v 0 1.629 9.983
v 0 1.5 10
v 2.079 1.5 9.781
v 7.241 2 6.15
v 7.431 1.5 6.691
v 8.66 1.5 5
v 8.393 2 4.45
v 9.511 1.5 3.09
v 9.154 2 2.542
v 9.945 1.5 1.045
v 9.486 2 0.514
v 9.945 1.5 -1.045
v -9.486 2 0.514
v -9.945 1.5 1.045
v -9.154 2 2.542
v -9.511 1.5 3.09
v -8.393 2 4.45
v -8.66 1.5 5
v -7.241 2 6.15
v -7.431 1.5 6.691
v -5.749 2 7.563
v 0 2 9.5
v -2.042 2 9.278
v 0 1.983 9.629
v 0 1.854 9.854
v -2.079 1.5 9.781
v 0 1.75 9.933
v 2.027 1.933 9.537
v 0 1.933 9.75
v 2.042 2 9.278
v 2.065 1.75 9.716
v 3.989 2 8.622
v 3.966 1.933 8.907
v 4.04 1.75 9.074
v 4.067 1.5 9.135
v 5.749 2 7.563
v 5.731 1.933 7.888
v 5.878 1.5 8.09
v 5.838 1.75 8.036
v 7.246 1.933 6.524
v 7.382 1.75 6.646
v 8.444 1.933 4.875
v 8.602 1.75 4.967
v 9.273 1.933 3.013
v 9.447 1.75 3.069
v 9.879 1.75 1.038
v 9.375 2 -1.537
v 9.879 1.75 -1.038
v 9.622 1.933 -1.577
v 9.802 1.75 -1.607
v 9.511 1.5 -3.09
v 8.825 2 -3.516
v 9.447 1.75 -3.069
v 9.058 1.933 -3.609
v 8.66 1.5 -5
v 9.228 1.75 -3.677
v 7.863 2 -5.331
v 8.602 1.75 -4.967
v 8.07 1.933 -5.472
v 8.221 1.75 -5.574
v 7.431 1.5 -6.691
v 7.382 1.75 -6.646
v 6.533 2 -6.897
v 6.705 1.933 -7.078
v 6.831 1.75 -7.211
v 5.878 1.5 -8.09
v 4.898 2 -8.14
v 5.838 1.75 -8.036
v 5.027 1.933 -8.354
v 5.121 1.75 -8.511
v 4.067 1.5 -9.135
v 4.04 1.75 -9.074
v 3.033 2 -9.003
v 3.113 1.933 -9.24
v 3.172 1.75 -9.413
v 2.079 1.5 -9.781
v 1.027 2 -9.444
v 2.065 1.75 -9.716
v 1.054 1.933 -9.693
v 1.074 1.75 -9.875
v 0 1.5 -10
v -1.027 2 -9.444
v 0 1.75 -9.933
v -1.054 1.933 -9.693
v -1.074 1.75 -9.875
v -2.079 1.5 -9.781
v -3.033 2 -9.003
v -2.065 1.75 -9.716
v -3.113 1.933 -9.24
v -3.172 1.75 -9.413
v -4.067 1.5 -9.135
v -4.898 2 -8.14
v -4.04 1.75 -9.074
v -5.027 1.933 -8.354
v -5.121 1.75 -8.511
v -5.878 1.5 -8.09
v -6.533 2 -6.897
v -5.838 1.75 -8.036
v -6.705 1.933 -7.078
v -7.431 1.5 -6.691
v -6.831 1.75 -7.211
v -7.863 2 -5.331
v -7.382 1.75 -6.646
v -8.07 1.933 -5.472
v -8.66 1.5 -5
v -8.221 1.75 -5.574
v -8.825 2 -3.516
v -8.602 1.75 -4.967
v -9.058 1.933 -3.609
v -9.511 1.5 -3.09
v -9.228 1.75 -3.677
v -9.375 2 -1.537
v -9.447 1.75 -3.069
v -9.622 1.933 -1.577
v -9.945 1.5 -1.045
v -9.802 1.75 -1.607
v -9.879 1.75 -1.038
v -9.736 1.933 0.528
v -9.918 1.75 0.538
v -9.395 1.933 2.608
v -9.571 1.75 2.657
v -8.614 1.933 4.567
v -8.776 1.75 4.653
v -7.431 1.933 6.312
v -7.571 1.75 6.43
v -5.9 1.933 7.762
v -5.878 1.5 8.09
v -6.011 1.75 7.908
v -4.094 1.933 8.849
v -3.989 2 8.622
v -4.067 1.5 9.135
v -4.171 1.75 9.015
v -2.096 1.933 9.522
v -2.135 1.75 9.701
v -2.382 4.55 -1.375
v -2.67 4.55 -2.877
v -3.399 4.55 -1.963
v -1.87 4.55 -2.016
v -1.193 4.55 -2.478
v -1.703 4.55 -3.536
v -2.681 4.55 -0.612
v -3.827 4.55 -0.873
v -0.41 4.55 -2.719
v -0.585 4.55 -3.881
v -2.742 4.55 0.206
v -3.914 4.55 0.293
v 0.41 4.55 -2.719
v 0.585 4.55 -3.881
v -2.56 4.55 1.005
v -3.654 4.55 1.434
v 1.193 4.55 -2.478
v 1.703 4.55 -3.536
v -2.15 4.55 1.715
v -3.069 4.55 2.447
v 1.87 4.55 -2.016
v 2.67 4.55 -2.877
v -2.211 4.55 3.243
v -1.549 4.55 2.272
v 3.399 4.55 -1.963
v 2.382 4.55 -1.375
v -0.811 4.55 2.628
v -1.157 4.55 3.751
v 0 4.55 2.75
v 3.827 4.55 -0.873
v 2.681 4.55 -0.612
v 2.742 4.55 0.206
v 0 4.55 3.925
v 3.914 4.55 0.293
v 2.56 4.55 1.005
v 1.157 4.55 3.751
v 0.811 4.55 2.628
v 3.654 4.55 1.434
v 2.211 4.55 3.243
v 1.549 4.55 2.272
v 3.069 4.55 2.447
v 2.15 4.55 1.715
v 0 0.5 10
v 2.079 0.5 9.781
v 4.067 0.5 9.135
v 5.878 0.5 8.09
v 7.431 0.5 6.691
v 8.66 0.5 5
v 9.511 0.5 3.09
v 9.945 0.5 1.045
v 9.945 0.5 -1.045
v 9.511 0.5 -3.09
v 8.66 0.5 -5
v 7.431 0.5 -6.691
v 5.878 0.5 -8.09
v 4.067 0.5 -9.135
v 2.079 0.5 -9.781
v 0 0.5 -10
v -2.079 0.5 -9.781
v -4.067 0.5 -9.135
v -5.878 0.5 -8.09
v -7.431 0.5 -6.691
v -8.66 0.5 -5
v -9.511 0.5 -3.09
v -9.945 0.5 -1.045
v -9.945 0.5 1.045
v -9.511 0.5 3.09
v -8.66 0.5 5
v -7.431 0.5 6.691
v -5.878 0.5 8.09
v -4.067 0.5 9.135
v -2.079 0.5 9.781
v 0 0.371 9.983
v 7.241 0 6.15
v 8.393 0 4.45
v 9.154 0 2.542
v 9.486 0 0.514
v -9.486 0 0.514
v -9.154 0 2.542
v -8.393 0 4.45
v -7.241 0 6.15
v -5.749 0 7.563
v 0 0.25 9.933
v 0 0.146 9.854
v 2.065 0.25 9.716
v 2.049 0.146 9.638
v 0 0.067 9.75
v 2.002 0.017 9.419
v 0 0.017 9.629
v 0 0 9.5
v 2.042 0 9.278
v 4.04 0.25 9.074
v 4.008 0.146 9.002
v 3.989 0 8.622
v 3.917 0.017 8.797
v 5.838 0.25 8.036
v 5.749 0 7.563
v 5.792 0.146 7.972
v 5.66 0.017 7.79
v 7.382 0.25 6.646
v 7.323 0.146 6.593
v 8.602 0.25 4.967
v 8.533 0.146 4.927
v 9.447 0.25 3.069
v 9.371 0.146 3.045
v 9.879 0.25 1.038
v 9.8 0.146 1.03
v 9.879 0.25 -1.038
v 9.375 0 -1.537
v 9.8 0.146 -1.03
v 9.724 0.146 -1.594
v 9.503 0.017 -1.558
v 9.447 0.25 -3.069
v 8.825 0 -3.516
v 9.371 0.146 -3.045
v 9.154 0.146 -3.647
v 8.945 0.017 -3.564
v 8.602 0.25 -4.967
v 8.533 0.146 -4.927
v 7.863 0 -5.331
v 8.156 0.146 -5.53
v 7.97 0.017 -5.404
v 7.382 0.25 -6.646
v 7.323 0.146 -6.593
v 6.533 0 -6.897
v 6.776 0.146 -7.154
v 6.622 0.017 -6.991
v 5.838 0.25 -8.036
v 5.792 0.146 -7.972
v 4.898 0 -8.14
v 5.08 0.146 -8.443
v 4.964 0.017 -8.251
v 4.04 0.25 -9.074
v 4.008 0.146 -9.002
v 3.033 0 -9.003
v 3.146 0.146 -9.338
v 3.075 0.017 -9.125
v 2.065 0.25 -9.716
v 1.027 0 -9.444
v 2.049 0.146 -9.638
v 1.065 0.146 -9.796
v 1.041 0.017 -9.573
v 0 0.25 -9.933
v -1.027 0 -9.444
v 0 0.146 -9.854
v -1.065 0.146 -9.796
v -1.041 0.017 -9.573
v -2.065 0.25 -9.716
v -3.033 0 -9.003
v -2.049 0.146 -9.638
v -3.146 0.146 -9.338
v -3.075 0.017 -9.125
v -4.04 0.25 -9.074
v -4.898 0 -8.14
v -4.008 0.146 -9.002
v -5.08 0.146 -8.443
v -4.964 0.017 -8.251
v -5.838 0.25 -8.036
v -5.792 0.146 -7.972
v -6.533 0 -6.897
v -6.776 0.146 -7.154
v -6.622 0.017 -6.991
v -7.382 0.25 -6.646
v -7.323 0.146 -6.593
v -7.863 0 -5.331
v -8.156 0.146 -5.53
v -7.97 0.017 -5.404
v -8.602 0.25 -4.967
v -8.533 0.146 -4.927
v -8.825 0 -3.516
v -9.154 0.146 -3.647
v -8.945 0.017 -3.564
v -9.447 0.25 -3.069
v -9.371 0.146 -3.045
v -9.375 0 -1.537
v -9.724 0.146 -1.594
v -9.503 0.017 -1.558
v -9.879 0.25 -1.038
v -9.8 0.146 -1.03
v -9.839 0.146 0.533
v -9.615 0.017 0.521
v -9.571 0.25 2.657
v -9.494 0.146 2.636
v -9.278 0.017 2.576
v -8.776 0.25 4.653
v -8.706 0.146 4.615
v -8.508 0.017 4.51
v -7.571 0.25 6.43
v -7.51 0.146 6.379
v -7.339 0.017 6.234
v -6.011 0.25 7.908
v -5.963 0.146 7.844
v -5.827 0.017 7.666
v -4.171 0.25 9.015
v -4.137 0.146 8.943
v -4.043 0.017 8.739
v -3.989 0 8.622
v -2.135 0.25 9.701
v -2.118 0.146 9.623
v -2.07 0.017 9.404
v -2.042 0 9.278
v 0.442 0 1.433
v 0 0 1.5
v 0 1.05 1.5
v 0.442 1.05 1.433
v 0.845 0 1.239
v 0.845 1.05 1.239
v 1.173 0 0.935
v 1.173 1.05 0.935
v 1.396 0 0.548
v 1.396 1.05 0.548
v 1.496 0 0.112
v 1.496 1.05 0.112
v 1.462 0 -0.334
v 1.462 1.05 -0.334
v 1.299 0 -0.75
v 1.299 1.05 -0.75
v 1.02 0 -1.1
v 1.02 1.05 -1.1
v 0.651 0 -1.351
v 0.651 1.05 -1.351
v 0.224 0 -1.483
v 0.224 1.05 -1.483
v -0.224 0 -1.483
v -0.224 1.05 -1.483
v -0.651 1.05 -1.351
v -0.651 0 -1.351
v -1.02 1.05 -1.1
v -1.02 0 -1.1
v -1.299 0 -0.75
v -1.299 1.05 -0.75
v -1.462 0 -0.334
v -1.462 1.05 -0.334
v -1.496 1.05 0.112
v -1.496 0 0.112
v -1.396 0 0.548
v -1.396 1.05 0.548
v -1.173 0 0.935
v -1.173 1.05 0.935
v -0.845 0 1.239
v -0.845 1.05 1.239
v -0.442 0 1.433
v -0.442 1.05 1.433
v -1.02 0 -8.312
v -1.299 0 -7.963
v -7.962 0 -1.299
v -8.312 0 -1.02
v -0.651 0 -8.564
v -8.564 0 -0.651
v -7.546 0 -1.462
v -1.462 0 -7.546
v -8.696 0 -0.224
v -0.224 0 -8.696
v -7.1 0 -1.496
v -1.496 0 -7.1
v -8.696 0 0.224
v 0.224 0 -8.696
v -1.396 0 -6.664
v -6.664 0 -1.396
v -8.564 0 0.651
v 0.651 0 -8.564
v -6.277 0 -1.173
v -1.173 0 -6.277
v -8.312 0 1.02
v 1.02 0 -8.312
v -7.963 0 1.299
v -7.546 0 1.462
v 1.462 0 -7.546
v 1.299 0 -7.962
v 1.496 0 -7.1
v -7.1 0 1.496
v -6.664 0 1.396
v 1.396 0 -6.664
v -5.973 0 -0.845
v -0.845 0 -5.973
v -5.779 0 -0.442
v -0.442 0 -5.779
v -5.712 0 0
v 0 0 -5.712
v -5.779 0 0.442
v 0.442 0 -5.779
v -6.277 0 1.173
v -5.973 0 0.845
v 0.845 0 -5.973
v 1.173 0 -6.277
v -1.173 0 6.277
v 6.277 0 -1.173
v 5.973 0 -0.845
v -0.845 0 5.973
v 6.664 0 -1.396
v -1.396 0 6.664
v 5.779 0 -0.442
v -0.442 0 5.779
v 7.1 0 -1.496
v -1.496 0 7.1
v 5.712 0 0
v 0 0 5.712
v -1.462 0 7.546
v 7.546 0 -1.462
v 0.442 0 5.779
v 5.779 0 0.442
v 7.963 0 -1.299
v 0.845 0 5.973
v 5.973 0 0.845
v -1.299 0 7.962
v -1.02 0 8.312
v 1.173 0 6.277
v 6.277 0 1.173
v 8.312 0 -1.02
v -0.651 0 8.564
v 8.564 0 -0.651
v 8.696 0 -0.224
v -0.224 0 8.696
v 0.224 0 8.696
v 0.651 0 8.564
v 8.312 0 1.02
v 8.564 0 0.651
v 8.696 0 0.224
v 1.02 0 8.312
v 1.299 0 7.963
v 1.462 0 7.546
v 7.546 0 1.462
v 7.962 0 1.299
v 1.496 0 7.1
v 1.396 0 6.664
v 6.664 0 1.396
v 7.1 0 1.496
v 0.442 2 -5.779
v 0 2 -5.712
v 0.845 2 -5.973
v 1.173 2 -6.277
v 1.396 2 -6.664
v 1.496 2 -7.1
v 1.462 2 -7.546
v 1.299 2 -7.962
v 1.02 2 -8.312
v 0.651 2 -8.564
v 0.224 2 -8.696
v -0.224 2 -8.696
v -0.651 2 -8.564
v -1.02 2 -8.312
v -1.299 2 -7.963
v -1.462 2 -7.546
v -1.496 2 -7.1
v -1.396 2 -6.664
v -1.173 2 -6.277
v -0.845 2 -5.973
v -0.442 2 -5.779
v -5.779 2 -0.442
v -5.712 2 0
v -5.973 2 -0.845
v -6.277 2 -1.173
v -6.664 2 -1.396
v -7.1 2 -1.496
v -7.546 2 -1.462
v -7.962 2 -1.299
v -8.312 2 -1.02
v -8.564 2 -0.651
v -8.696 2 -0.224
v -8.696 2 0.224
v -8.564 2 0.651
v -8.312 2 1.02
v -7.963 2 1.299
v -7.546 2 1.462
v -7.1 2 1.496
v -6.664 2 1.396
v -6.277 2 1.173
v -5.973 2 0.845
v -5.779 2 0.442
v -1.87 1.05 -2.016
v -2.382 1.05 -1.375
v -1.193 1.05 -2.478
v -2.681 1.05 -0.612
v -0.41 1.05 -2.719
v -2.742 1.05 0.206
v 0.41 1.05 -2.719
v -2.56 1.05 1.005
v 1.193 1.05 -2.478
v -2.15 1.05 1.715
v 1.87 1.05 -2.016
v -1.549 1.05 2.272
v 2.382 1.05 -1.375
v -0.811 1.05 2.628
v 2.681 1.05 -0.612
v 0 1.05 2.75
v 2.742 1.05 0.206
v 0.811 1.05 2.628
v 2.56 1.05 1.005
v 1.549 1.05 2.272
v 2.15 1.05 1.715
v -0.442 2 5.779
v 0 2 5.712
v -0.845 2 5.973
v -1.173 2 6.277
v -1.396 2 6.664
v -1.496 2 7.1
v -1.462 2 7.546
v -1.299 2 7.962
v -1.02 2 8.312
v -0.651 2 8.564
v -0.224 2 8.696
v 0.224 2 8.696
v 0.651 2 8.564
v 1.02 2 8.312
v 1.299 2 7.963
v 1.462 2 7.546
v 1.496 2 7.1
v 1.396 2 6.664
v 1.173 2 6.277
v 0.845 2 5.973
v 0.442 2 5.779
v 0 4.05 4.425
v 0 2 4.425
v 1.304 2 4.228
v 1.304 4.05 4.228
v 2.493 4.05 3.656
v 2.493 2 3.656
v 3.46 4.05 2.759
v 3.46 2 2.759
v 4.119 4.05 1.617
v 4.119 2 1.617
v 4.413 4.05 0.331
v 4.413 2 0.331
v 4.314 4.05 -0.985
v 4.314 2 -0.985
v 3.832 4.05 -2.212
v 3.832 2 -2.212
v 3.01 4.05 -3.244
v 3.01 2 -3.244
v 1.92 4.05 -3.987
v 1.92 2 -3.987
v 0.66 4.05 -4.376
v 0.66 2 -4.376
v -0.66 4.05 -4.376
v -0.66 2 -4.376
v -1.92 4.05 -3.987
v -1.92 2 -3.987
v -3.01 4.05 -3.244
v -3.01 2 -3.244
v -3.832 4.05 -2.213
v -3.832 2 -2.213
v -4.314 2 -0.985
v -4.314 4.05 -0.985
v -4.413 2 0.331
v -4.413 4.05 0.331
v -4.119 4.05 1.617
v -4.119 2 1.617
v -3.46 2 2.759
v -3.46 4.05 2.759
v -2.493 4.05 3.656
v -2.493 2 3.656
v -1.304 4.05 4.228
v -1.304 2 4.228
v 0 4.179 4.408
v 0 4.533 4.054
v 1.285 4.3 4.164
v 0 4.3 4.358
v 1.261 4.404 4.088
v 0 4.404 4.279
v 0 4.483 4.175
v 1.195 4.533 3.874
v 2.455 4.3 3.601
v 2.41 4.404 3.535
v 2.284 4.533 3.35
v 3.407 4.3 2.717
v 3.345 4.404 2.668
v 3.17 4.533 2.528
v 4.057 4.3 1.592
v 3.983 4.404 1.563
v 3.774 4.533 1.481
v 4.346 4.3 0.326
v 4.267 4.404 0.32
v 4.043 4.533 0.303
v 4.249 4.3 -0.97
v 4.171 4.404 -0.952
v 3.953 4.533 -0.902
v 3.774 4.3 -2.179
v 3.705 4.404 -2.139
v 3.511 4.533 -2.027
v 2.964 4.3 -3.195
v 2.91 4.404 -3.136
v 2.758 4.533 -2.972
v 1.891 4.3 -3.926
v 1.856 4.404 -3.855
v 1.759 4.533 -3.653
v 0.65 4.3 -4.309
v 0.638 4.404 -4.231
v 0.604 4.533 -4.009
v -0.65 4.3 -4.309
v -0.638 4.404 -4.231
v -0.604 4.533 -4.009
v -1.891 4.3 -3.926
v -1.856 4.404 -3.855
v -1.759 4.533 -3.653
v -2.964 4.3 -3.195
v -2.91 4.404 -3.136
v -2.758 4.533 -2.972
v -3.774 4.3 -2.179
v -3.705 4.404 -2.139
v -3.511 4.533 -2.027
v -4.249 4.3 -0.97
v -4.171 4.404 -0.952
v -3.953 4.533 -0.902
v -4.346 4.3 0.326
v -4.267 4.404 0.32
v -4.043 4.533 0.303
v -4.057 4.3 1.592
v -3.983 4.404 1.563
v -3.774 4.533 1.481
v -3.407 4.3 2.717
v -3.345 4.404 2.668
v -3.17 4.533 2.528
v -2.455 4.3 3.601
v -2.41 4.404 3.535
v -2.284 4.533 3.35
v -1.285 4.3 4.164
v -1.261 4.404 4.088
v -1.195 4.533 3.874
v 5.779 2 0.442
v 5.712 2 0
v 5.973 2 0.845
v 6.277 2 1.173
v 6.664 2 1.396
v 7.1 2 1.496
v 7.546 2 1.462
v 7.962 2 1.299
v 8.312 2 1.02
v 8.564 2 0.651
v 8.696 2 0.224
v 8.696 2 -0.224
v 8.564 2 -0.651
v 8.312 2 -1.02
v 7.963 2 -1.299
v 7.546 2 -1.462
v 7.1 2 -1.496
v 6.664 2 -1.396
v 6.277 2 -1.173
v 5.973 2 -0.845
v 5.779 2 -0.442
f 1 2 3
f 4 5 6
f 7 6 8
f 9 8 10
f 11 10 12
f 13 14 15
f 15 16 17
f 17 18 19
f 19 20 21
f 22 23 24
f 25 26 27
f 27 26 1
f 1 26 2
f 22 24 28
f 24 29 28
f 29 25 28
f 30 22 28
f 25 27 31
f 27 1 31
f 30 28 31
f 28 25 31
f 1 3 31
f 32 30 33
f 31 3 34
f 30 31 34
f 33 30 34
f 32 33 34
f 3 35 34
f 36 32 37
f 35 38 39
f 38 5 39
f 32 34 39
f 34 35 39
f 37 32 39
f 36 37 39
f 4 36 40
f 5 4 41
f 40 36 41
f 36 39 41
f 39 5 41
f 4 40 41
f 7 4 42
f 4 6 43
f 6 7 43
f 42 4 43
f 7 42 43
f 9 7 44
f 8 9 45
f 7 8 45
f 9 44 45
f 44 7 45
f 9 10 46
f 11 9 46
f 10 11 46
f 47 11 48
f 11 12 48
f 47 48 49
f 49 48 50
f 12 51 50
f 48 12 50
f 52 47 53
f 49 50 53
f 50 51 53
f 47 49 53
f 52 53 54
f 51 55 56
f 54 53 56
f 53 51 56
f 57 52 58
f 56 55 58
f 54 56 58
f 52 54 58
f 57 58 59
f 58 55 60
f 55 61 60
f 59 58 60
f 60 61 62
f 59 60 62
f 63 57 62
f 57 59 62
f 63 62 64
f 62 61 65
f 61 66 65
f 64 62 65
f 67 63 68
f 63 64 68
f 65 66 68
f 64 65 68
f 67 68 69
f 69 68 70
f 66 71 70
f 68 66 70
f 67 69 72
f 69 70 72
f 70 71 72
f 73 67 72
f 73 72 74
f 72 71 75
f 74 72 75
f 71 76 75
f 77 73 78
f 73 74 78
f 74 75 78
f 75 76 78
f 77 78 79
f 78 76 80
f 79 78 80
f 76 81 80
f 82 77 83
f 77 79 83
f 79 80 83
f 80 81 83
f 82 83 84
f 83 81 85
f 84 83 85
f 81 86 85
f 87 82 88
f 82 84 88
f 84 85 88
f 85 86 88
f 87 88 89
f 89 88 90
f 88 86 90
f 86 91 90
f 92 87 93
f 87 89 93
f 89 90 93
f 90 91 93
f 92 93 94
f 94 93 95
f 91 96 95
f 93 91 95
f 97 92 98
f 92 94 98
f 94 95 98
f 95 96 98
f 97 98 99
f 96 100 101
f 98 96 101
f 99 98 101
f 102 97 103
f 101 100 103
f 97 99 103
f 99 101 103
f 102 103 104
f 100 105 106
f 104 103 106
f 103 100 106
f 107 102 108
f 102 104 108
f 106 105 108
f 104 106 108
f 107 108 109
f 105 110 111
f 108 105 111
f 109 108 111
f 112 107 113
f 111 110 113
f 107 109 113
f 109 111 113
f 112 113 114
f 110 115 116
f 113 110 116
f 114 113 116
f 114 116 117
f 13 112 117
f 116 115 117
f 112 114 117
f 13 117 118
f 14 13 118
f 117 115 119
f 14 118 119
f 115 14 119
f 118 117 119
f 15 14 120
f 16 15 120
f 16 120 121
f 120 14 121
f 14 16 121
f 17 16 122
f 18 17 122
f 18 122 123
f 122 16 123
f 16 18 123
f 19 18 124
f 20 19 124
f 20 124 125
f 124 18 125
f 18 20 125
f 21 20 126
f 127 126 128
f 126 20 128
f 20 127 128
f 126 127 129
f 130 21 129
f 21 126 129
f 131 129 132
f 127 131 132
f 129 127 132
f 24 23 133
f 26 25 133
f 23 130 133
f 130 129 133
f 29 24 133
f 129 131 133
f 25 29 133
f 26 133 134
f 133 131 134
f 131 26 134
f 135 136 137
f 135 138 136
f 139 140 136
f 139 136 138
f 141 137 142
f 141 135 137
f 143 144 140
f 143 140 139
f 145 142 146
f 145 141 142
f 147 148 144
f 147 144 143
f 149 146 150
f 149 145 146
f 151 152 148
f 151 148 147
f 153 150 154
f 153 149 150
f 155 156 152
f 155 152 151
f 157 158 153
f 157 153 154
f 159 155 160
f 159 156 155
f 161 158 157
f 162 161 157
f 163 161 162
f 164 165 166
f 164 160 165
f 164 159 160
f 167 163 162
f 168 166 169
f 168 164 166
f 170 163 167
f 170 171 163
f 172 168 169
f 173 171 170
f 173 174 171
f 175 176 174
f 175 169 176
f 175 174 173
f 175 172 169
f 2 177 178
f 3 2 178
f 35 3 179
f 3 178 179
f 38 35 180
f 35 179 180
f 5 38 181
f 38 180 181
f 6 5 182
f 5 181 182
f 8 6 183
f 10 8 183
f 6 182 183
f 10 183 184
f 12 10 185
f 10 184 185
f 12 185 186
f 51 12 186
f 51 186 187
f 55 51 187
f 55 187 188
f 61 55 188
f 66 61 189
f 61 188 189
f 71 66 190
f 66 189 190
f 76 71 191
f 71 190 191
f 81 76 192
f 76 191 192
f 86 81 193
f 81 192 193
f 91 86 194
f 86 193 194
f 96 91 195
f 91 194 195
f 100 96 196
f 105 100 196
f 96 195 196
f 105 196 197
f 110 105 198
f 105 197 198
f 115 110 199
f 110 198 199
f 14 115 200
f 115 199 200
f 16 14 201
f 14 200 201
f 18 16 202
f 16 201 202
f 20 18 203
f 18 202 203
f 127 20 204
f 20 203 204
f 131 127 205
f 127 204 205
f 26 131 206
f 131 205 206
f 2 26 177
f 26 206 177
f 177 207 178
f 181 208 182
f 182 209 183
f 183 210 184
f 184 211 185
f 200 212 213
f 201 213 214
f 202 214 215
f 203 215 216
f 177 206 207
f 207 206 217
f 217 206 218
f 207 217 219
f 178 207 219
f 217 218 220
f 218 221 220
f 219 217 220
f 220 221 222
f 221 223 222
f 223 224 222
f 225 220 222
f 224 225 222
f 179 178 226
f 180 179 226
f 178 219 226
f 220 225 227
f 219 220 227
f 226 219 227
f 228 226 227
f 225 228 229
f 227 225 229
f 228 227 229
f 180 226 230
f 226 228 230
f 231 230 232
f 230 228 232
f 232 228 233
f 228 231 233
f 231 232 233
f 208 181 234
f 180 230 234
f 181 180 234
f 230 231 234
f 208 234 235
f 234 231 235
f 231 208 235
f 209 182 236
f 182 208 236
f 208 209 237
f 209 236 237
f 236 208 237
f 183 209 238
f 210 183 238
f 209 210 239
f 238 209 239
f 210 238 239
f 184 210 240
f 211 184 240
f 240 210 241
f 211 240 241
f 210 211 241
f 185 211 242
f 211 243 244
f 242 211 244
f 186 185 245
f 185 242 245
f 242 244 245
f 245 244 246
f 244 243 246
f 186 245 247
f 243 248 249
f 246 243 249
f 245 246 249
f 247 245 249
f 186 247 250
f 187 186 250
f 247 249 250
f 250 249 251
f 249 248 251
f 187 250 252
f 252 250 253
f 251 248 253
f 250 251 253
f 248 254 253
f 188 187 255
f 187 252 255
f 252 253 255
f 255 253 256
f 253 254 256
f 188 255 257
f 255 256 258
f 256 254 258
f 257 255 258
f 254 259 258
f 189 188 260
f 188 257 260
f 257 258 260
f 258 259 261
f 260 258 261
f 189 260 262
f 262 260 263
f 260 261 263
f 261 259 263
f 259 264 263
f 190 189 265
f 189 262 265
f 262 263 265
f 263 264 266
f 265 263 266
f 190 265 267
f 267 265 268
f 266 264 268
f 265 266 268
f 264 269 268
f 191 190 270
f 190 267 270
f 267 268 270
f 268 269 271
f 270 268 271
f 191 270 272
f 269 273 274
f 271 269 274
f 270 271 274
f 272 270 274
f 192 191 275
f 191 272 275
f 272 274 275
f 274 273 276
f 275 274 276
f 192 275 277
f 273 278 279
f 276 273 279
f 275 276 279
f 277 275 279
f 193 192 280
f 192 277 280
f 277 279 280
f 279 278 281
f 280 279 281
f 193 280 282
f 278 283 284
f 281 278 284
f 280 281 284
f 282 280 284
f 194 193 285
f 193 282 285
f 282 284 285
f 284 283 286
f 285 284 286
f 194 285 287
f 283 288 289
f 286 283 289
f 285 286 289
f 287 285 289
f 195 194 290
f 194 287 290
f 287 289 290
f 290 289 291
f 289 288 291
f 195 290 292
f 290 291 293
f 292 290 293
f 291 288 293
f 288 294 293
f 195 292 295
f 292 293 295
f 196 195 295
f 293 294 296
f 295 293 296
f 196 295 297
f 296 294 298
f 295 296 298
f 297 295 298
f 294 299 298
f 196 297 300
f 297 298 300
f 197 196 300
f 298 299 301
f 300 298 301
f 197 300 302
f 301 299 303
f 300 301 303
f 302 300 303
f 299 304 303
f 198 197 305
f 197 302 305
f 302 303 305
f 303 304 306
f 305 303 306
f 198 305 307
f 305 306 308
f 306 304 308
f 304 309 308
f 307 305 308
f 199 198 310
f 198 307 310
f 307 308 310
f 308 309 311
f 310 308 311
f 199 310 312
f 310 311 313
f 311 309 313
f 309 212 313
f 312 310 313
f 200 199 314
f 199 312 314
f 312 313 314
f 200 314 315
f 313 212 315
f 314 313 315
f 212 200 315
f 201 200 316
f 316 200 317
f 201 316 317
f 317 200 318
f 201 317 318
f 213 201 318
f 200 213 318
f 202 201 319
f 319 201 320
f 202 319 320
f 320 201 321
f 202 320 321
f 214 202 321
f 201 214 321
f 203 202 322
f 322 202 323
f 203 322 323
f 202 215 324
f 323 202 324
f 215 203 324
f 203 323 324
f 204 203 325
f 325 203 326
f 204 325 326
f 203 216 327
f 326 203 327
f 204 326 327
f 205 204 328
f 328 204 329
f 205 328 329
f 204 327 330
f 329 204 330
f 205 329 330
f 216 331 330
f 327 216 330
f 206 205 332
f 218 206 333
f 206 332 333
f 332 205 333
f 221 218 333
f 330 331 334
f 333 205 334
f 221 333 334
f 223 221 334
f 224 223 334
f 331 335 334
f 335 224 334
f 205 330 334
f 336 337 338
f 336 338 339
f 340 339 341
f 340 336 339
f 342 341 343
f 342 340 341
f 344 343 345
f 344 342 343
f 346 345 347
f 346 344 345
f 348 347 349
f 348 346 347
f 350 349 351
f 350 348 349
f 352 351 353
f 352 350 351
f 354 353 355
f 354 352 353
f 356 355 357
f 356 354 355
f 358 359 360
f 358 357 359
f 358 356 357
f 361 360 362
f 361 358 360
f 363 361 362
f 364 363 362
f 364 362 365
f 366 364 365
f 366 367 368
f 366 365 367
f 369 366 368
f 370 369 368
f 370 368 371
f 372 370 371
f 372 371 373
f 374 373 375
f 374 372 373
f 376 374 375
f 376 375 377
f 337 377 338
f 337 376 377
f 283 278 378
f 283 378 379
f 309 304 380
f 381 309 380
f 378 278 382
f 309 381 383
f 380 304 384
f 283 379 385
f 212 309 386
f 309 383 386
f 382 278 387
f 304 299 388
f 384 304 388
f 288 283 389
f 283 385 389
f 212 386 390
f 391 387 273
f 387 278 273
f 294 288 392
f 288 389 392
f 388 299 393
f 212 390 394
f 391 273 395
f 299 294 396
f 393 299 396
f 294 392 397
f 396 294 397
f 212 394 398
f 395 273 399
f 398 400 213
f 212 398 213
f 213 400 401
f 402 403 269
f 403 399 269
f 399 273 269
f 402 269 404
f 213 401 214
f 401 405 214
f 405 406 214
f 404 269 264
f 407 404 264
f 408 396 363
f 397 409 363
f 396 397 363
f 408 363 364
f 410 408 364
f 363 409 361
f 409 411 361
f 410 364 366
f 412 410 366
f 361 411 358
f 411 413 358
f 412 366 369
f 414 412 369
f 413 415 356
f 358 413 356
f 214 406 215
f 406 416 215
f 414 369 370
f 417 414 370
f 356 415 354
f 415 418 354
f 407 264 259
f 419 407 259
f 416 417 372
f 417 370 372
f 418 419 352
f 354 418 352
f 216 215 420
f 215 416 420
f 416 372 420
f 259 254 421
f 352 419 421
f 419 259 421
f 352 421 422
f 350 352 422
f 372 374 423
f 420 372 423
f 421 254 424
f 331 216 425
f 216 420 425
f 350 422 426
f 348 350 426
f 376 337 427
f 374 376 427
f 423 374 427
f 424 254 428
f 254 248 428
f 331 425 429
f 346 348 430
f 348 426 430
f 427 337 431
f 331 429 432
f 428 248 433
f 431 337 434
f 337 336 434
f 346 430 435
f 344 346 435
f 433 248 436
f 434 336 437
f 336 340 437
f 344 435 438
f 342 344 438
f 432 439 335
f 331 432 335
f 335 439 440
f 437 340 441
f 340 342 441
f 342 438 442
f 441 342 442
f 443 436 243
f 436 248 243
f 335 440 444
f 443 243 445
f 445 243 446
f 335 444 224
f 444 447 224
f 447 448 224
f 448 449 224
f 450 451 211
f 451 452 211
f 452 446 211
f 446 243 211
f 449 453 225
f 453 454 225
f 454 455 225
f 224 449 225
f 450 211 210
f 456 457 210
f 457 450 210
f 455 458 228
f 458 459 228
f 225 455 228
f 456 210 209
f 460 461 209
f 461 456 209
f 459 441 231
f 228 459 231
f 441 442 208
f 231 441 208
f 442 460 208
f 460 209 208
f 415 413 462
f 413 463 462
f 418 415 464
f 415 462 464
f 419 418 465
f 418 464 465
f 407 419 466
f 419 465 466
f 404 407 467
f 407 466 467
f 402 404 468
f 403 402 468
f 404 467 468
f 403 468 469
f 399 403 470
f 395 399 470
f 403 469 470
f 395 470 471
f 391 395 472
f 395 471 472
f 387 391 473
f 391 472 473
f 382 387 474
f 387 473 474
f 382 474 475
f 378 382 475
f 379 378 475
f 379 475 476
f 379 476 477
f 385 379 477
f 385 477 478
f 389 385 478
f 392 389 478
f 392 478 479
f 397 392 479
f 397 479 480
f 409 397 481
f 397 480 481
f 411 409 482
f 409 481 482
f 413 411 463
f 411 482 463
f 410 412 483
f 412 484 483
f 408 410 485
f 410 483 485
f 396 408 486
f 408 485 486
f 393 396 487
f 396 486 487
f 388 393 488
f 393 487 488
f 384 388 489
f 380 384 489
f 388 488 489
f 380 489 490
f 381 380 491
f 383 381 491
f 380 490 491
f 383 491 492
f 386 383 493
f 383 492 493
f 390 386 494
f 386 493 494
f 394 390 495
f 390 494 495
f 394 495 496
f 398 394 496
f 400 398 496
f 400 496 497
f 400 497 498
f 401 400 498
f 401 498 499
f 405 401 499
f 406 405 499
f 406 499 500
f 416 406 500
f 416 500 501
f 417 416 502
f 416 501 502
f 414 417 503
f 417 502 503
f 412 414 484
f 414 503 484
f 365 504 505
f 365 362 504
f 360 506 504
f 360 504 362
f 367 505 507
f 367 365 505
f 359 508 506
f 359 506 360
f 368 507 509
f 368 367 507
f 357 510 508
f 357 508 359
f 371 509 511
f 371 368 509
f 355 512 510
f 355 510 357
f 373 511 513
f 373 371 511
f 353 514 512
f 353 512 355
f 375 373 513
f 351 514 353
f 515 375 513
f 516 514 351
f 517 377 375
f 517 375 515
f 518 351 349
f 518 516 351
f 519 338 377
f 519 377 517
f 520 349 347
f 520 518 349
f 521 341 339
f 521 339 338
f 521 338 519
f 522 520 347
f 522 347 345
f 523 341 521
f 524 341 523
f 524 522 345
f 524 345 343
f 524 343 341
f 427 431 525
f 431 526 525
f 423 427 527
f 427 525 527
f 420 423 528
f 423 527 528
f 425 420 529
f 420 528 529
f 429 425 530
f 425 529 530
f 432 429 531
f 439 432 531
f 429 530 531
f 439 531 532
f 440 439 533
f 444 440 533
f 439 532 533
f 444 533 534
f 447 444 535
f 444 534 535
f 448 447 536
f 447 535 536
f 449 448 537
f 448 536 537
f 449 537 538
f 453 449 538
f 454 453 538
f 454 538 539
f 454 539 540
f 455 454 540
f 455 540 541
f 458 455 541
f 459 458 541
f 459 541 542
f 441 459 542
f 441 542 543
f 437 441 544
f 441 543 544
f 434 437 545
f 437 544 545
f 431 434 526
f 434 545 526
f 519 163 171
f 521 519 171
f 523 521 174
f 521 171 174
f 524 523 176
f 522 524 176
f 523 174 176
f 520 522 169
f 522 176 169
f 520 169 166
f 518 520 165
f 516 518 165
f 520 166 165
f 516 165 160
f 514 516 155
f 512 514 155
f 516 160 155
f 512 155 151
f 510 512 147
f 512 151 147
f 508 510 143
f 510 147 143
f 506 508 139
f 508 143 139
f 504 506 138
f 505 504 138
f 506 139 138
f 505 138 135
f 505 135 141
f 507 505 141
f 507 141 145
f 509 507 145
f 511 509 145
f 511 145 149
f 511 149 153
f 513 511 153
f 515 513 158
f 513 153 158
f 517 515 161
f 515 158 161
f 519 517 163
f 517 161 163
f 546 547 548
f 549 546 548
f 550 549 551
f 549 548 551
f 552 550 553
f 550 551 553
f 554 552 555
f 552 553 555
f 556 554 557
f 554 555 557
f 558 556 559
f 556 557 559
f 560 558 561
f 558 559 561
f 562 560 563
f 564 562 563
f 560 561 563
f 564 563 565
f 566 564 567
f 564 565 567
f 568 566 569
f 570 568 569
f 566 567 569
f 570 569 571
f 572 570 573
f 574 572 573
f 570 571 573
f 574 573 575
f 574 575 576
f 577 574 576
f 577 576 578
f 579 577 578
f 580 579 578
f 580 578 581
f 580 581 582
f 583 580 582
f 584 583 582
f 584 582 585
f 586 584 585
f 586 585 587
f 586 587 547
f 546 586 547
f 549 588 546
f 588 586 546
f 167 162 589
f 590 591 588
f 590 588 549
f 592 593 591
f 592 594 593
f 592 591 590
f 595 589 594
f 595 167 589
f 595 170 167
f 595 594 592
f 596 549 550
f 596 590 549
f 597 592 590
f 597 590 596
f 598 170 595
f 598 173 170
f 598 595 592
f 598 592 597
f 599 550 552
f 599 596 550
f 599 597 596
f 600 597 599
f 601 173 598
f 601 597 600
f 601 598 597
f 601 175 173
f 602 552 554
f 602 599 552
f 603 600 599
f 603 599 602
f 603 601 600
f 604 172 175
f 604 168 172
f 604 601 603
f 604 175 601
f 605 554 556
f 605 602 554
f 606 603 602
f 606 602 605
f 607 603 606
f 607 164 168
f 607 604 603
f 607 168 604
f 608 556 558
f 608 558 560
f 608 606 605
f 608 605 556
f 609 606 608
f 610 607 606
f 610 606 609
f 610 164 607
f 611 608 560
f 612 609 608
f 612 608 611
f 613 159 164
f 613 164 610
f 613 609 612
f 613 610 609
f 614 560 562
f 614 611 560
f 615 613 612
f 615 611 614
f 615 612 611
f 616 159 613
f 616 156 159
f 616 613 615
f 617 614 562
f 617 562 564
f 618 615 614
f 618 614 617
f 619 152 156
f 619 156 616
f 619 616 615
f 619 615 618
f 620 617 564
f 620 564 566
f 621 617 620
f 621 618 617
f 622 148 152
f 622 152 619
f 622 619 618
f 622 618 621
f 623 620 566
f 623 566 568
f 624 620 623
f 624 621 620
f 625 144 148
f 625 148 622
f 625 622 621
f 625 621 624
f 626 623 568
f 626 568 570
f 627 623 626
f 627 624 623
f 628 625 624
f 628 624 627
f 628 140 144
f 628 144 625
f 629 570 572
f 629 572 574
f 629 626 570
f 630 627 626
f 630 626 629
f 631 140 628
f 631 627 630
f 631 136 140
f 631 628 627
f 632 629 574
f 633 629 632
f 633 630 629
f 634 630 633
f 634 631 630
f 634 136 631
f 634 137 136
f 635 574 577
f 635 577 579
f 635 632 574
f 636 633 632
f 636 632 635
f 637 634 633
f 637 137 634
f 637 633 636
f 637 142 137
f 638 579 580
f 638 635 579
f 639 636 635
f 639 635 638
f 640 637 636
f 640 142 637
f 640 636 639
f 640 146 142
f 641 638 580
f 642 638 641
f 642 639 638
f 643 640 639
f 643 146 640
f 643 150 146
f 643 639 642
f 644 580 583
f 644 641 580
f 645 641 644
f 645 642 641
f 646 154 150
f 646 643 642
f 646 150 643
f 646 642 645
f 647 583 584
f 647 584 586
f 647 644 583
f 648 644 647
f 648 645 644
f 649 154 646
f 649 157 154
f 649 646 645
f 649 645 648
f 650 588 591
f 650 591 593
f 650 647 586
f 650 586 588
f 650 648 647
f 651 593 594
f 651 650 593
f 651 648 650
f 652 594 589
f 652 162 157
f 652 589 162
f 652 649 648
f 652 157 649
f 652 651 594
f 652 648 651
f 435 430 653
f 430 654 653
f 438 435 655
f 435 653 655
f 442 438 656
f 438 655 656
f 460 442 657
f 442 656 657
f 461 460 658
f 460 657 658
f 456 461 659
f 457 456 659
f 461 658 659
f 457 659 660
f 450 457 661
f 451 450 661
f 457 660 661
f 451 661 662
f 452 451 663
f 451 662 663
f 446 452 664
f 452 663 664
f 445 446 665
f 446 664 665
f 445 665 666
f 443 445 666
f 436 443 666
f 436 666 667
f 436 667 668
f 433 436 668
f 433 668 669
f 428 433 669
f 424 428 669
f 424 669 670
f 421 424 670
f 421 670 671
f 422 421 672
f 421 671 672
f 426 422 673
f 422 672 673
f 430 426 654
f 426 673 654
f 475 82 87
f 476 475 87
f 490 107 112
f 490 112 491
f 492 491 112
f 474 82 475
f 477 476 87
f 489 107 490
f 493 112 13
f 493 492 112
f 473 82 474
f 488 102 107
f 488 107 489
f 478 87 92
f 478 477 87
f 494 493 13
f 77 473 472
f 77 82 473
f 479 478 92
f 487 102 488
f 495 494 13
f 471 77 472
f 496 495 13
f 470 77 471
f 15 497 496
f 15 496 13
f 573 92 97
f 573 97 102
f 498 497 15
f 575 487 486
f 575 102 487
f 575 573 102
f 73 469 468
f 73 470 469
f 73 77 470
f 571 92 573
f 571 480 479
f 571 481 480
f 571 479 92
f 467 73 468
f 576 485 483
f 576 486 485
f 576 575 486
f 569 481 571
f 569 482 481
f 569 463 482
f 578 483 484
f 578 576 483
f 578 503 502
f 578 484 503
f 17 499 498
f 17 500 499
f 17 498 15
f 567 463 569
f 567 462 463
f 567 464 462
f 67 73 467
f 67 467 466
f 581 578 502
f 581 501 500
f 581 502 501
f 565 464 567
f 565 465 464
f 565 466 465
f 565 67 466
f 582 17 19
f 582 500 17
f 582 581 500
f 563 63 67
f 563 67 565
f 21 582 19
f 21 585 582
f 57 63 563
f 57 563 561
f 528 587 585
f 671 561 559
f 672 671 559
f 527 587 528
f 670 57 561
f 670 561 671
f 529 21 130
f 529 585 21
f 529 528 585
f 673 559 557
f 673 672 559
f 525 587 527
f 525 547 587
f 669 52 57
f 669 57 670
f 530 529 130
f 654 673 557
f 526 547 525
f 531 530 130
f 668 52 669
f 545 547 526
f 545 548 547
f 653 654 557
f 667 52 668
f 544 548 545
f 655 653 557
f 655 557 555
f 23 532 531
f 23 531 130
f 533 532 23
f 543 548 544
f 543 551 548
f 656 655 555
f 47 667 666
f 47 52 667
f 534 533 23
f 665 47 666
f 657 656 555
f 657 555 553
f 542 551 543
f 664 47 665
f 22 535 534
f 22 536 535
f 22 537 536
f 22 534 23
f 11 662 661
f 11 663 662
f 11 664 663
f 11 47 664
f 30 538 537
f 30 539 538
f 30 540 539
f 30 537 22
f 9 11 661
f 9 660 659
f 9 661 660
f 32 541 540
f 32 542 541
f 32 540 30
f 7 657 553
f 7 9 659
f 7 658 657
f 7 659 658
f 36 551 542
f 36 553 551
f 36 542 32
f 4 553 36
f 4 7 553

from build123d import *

# Parameters (mm, degrees)
SKETCH1_R               = 10
SKETCH1_R_2             = 4.425
BOSS_EXTRUDE1_DEPTH     = 2
SKETCH1_2_R             = 4.425
BOSS_EXTRUDE2_DEPTH     = 4.55
SKETCH2_R               = 2.75
CUT_EXTRUDE1_DEPTH      = 3.5
CUT_EXTRUDE2_DEPTH      = 15.85605937
CUT_EXTRUDE2_DEPTH_BACK = 15.85605937
SKETCH2_3_R             = 1.5
SKETCH3_R               = 1.5
CUT_EXTRUDE3_DEPTH      = 15.370194849
CIRPATTERN1_COUNT       = 4
FILLET1_R               = 0.5


with BuildPart() as part:
    # Sketch1 → Boss-Extrude1 (new body)
    with BuildSketch(Plane(origin=(0, 0, 0), x_dir=(1, 0, 0), z_dir=(0, 1, 0))):
        Circle(SKETCH1_R)
        Circle(SKETCH1_R_2, mode=Mode.SUBTRACT)
    extrude(amount=BOSS_EXTRUDE1_DEPTH)

    # Sketch1<2> → Boss-Extrude2 (add)
    with BuildSketch(Plane(origin=(0, 0, 0), x_dir=(1, 0, 0), z_dir=(0, 1, 0))):
        Circle(SKETCH1_2_R)
    extrude(amount=BOSS_EXTRUDE2_DEPTH)

    # Sketch2 → Cut-Extrude1 (cut)
    with BuildSketch(Plane(origin=(0, 4.55, 0), x_dir=(1, 0, 0), z_dir=(0, 1, 0))):
        Circle(SKETCH2_R)
    extrude(amount=-CUT_EXTRUDE1_DEPTH, mode=Mode.SUBTRACT)

    # Sketch2<3> → Cut-Extrude2 (cut, two sides: drawn at the far end of the back side and taken through both)
    with BuildSketch(Plane(origin=(0, 4.55, 0), x_dir=(1, 0, 0), z_dir=(0, 1, 0)).offset(-CUT_EXTRUDE2_DEPTH_BACK)):
        Circle(SKETCH2_3_R)
    extrude(amount=CUT_EXTRUDE2_DEPTH + CUT_EXTRUDE2_DEPTH_BACK, mode=Mode.SUBTRACT)

    # Sketch3 → Cut-Extrude3 (cut, symmetric)
    with BuildSketch(Plane(origin=(0, 2, 0), x_dir=(1, 0, 0), z_dir=(0, 1, 0))):
        with Locations((0, 7.2125)):
            Circle(SKETCH3_R)
    cut_extrude3 = extrude(amount=CUT_EXTRUDE3_DEPTH, both=True, mode=Mode.SUBTRACT)

    # CirPattern1: Cut-Extrude3 ×4 about axis
    cirpattern1_axis = Axis((0, 4.55, 0), (0, -1, 0))
    for i in range(1, CIRPATTERN1_COUNT):
        add(cut_extrude3.rotate(cirpattern1_axis, i * 360 / CIRPATTERN1_COUNT), mode=Mode.SUBTRACT)

    # Fillet1
    fillet1_edges = [part.edges().sort_by_distance(p)[0] for p in [
        (-4.425, 4.55, 0),
        (-10, 2, 0),
        (-10, 0, 0),
    ]]
    fillet(fillet1_edges, radius=FILLET1_R)


solid = part.part
